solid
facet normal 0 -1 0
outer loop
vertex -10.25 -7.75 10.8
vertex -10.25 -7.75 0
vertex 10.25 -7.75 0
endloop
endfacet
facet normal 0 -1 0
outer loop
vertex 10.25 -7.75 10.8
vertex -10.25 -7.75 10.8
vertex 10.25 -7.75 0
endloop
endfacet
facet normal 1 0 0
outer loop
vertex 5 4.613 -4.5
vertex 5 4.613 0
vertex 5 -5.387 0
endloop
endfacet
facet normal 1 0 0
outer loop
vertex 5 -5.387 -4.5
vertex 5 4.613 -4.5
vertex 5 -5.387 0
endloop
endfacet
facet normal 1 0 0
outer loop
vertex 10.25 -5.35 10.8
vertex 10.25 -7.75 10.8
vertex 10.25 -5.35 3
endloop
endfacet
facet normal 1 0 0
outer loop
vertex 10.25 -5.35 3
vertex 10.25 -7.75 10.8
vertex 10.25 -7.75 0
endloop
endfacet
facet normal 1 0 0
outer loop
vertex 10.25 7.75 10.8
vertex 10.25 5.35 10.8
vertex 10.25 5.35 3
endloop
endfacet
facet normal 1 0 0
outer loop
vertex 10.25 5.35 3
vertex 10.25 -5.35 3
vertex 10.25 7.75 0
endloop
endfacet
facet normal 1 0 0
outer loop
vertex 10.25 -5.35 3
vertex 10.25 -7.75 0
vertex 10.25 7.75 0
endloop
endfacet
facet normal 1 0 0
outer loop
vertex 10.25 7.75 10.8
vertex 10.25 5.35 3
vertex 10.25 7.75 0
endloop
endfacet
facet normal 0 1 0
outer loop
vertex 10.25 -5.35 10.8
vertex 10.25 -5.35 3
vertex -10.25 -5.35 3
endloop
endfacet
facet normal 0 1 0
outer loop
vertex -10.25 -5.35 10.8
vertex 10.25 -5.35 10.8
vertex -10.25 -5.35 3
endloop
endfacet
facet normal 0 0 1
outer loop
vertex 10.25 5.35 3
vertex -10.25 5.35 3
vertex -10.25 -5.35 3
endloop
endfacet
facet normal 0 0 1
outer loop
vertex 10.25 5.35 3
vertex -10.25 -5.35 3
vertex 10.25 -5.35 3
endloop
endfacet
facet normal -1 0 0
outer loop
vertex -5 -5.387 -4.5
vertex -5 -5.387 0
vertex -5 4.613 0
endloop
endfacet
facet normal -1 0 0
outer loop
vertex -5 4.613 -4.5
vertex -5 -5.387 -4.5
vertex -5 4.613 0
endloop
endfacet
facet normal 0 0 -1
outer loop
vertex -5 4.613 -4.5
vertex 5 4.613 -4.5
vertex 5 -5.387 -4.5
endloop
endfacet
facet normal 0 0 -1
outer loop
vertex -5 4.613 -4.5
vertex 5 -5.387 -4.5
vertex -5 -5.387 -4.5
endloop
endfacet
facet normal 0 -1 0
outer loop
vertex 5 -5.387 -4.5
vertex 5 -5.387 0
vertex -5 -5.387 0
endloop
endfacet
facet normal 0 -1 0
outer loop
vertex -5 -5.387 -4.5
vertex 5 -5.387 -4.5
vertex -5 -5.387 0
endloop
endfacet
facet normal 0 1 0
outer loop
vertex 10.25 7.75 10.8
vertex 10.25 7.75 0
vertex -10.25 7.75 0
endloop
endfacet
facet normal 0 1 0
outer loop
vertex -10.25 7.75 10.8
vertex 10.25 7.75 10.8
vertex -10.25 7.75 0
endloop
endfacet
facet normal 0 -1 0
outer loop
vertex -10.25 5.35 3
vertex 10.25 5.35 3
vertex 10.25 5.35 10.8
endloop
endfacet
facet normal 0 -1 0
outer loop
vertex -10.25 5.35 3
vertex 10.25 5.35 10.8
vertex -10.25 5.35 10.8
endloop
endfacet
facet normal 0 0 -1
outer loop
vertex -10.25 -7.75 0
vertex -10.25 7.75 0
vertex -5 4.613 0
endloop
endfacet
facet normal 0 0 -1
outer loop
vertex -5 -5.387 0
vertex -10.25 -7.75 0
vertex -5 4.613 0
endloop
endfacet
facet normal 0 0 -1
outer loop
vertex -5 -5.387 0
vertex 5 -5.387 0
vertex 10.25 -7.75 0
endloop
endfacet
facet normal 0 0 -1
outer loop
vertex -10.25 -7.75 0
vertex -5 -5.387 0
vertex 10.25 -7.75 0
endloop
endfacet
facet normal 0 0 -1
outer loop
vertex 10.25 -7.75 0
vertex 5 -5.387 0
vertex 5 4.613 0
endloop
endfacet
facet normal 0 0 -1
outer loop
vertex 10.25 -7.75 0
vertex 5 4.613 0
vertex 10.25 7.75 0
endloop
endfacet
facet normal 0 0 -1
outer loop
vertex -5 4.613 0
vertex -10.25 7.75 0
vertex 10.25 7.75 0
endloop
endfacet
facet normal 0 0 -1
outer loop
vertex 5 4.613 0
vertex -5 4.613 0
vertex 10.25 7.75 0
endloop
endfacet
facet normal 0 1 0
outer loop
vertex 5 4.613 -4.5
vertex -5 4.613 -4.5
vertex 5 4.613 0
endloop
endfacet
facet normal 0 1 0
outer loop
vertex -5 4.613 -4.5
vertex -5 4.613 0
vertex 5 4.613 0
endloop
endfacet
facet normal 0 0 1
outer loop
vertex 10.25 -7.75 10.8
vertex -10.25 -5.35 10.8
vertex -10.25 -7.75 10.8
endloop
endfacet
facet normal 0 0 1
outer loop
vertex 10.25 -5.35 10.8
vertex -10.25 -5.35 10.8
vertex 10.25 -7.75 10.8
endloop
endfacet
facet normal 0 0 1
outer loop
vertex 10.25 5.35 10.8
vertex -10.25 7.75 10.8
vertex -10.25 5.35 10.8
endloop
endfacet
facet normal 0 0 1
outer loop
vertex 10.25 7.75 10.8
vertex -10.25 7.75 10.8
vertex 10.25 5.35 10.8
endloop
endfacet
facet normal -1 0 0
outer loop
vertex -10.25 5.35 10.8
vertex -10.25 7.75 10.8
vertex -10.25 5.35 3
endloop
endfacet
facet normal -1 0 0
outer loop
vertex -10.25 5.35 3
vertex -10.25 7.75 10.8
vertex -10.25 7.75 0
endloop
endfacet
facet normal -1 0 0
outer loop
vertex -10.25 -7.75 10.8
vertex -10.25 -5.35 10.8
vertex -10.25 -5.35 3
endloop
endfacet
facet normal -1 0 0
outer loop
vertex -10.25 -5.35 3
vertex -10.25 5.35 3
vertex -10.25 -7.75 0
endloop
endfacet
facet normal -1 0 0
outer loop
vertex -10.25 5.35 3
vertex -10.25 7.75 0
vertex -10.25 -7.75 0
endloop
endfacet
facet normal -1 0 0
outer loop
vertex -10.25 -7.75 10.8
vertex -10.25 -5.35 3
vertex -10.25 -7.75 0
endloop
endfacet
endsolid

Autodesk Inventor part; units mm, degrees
ref_plane "YZ Plane" through (0, 0, 0) normal (1, 0, 0) x (0, 1, 0)
ref_plane "XZ Plane" through (0, 0, 0) normal (0, 1, 0) x (-1, 0, 0)
ref_plane "XY Plane" through (0, 0, 0) normal (0, 0, 1) x (1, 0, 0)
sketch "스케치1" plane through (0, 0, 0) normal (0, 0, 1) x (1, 0, 0)
  line L0 (-10.25, -7.75) -> (10.25, -7.75)
  line L1 (10.25, -7.75) -> (10.25, 7.75)
  line L2 (10.25, 7.75) -> (-10.25, 7.75)
  line L3 (-10.25, 7.75) -> (-10.25, -7.75)
  line L4 (-10.25, -7.75) -> (10.25, 7.75) construction
  line L5 (10.25, -7.75) -> (-10.25, 7.75) construction
  point P0 (0, 0)
  dimension "d0" = 20.5
  dimension "d1" = 15.5
extrude "돌출1" add sketch "스케치1" along normal blind 3
sketch "스케치2" plane through (0, 0, 3) normal (0, 0, 1) x (1, 0, 0)
  line L0 (10.25, 7.75) -> (-10.25, 7.75) projected
  line L1 (-10.25, 7.75) -> (10.25, 7.75)
  line L2 (10.25, 7.75) -> (10.25, 5.35)
  line L3 (10.25, 5.35) -> (-10.25, 5.35)
  line L4 (-10.25, 5.35) -> (-10.25, 7.75)
  line L5 (0, 0) -> (4.2226, 0)
  line L6 (10.25, -7.75) -> (-10.25, -7.75)
  line L7 (-10.25, -7.75) -> (10.25, -7.75)
  line L8 (10.25, -7.75) -> (10.25, -5.35)
  line L9 (10.25, -5.35) -> (-10.25, -5.35)
  line L10 (-10.25, -5.35) -> (-10.25, -7.75)
  dimension "d4" = 2.4
extrude "돌출2" add sketch "스케치2" along normal blind 7.8
sketch "스케치3" plane through (0, 0, 0) normal (0, 0, -1) x (-1, 0, 0)
  line L0 (-5, -5.3868) -> (5, -5.3868)
  line L1 (5, -5.3868) -> (5, 4.6132)
  line L2 (5, 4.6132) -> (-5, 4.6132)
  line L3 (-5, 4.6132) -> (-5, -5.3868)
  line L4 (-5, -5.3868) -> (5, 4.6132) construction
  line L5 (5, -5.3868) -> (-5, 4.6132) construction
  point P0 (0, 0)
  point P1 (0, -0.3868)
  dimension "d7" = 10
  dimension "d8" = 10
extrude "돌출3" add sketch "스케치3" along normal blind 4.5
properties part number "스텝모터 드라이버"
